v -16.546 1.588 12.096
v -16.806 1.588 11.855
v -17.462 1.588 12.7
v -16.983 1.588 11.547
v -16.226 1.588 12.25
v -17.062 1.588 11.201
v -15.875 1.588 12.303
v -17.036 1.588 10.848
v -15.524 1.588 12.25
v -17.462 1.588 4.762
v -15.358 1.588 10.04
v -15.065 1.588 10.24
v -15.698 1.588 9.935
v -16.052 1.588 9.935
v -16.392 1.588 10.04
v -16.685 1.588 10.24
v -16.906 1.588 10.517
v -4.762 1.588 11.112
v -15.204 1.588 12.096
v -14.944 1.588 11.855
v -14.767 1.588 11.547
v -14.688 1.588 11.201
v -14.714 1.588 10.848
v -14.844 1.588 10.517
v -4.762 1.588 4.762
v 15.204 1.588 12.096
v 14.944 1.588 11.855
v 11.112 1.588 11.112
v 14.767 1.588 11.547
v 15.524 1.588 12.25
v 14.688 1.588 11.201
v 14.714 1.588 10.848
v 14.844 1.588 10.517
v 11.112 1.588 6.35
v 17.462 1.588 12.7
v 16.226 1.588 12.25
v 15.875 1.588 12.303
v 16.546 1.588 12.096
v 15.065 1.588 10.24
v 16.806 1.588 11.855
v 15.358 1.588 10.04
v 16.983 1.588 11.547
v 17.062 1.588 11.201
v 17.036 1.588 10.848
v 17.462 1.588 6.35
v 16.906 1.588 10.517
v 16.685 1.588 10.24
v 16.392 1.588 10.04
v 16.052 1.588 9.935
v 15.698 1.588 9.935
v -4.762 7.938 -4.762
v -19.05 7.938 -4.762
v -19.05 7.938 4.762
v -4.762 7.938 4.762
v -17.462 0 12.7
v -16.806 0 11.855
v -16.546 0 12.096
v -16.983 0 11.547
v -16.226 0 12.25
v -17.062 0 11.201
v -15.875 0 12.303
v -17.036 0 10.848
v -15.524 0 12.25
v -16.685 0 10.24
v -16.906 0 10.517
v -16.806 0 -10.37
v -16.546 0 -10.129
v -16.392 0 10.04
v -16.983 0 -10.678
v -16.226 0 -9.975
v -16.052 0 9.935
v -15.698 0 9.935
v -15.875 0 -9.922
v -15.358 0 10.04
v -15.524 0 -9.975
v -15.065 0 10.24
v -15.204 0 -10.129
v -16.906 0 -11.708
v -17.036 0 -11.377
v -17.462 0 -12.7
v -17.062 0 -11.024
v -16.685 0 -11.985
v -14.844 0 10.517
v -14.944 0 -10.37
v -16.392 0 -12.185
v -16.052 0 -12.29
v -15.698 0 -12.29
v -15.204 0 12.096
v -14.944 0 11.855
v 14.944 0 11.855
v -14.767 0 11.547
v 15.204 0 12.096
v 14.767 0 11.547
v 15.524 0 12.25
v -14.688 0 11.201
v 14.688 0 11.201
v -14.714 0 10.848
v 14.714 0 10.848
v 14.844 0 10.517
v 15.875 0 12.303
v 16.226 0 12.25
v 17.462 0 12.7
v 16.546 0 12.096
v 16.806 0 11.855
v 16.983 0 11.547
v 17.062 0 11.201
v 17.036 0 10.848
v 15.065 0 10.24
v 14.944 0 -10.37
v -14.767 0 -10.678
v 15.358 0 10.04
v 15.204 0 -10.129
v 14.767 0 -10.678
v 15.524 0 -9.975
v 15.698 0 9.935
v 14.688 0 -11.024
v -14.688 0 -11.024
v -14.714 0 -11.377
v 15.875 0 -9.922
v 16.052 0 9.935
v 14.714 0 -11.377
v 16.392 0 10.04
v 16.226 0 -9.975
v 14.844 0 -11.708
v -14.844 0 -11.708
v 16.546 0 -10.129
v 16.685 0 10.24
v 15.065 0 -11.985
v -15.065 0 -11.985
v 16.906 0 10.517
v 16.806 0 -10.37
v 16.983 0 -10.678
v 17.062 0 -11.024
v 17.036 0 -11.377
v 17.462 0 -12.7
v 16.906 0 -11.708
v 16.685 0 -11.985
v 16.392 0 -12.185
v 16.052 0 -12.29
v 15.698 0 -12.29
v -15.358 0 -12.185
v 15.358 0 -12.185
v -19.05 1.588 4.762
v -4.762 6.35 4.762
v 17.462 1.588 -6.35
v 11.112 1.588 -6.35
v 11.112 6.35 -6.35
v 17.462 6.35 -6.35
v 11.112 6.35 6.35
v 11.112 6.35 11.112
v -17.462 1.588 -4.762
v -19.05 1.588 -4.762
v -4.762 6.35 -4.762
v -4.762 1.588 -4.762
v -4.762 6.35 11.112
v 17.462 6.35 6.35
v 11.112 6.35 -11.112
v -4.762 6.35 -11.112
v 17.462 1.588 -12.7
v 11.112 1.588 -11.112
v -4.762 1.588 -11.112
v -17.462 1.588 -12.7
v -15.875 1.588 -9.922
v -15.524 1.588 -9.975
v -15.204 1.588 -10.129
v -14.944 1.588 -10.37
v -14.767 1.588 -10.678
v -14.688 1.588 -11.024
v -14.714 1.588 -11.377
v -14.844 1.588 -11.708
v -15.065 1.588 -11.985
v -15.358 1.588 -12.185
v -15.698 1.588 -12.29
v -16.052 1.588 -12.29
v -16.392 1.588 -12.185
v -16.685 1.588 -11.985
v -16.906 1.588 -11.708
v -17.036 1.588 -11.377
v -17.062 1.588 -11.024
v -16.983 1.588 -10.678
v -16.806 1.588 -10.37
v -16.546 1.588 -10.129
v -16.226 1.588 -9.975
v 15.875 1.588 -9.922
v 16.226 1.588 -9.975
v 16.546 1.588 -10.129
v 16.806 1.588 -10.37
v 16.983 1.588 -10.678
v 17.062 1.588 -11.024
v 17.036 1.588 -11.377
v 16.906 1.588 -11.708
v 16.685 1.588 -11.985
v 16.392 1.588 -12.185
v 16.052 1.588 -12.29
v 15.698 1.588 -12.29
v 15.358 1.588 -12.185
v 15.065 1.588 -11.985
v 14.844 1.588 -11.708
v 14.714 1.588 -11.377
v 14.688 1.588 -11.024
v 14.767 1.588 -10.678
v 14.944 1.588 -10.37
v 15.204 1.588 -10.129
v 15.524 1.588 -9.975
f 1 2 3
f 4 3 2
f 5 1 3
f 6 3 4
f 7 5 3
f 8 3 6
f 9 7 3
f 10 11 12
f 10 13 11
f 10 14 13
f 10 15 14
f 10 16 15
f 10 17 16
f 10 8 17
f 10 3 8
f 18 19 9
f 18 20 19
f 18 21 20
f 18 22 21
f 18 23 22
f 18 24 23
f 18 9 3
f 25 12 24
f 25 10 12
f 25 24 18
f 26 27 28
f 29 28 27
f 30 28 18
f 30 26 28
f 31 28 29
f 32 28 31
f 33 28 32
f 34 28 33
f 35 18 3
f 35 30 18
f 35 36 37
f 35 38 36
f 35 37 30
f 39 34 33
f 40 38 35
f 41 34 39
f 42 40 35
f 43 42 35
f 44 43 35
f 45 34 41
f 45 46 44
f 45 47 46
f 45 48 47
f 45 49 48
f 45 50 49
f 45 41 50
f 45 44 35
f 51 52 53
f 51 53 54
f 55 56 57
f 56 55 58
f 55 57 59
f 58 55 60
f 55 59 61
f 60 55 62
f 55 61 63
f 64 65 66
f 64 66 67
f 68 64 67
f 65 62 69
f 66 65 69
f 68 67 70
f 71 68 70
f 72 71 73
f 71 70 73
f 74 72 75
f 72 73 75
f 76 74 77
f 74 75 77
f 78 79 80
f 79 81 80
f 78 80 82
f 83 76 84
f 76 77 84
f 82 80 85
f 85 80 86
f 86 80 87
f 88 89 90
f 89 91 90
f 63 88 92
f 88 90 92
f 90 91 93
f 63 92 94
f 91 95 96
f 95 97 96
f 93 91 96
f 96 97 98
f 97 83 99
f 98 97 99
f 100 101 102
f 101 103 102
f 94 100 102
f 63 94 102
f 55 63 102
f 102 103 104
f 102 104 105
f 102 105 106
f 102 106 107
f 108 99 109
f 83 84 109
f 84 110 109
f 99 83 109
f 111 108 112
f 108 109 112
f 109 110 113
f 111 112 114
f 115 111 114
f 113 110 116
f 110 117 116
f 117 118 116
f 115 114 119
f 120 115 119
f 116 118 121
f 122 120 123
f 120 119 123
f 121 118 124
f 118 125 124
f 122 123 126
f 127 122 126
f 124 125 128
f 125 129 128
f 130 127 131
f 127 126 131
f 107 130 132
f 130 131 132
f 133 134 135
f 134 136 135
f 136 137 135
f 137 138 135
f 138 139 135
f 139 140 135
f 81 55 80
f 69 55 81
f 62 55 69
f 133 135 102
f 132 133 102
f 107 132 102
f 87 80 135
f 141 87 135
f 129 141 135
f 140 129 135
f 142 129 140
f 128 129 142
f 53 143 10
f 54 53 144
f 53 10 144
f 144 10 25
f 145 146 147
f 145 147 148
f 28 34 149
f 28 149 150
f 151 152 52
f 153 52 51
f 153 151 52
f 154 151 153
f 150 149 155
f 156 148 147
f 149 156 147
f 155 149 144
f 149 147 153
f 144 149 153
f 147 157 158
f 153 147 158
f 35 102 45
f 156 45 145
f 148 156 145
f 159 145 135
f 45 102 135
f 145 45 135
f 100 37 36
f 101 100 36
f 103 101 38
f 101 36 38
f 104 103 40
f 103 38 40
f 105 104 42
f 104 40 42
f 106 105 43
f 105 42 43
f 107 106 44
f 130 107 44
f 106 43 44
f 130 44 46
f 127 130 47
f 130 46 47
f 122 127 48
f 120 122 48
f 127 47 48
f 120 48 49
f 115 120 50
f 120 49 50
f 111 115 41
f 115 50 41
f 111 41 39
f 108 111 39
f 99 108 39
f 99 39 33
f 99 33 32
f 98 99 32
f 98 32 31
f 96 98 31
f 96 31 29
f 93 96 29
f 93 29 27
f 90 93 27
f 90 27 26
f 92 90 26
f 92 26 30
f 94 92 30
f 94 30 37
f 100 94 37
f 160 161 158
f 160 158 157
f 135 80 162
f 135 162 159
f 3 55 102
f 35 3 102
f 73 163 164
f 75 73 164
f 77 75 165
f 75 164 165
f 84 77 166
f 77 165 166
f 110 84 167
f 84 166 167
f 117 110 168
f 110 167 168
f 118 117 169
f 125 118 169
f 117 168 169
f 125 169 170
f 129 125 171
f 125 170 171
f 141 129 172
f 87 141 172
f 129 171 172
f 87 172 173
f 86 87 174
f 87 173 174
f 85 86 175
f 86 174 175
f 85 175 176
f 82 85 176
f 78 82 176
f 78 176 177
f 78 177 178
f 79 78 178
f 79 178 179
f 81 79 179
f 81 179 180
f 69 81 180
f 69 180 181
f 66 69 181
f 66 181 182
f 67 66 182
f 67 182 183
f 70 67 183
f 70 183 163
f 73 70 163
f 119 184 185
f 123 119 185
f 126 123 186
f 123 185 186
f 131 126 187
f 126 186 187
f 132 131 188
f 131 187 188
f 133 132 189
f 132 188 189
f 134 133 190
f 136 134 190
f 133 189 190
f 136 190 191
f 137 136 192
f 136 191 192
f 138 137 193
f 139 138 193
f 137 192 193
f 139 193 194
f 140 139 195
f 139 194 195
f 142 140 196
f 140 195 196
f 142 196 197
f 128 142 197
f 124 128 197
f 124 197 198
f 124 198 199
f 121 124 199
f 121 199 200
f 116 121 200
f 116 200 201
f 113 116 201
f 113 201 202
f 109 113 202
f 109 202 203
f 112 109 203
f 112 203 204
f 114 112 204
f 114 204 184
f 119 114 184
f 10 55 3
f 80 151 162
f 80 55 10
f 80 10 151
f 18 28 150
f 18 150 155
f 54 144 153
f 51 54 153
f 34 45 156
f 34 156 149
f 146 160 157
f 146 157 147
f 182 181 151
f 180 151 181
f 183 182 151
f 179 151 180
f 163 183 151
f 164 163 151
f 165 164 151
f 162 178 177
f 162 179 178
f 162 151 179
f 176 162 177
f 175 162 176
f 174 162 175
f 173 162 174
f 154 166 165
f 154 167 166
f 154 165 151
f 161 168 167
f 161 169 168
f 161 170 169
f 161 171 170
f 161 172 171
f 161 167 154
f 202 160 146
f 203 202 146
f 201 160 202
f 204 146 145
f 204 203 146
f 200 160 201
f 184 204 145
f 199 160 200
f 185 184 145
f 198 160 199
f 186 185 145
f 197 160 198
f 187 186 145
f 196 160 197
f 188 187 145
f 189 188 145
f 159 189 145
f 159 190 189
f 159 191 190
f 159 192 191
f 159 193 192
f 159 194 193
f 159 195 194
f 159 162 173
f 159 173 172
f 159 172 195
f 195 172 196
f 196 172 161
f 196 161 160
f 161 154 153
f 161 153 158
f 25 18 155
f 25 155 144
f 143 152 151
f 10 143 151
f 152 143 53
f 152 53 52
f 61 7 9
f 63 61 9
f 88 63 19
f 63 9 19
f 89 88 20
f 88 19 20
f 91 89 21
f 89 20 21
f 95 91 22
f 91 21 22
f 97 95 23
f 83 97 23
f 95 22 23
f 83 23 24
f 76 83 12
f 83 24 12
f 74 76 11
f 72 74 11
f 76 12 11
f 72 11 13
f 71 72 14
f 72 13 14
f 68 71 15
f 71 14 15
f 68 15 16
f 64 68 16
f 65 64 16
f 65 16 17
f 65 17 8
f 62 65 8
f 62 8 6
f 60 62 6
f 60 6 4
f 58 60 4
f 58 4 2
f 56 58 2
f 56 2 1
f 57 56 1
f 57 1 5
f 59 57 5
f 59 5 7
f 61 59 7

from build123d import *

# Parameters (mm, degrees)
SKETCH1_W           = 34.925
SKETCH1_H           = 25.4
BOSS_EXTRUDE1_DEPTH = 1.5875
BOSS_EXTRUDE2_DEPTH = 4.7625
SKETCH4_W           = 14.2875
SKETCH4_H           = 9.525
BOSS_EXTRUDE7_DEPTH = 6.35
SKETCH6_R           = 1.190625
CUT_EXTRUDE1_DEPTH  = 24.759524406


with BuildPart() as part:
    # Sketch1 → Boss-Extrude1 (new body)
    with BuildSketch(Plane(origin=(0, 0, 0), x_dir=(1, 0, 0), z_dir=(0, 1, 0))):
        Rectangle(SKETCH1_W, SKETCH1_H)
    extrude(amount=BOSS_EXTRUDE1_DEPTH)

    # Sketch2 → Boss-Extrude2 (add)
    with BuildSketch(Plane(origin=(0, 1.5875, 0), x_dir=(1, 0, 0), z_dir=(0, 1, 0))):
        Polygon((-4.7625, 11.1125), (11.1125, 11.1125), (11.1125, 6.35), (17.4625, 6.35), (17.4625, -6.35), (11.1125, -6.35), (11.1125, -11.1125), (-4.7625, -11.1125), align=None)
    extrude(amount=BOSS_EXTRUDE2_DEPTH)

    # Sketch4 → Boss-Extrude7 (add)
    with BuildSketch(Plane(origin=(0, 1.5875, 0), x_dir=(1, 0, 0), z_dir=(0, 1, 0))):
        with Locations((-11.90625, 0)):
            Rectangle(SKETCH4_W, SKETCH4_H)
    extrude(amount=BOSS_EXTRUDE7_DEPTH)

    # Sketch6 → Cut-Extrude1 (cut, through all)
    with BuildSketch(Plane(origin=(0, 1.5875, 0), x_dir=(1, 0, 0), z_dir=(0, 1, 0))):
        with Locations(Location((-15.875, 11.1125, 0), (0, 0, 270))):
            Circle(SKETCH6_R)
        with Locations(Location((-15.875, -11.1125, 0), (0, 0, 270))):
            Circle(SKETCH6_R)
        with Locations(Location((15.875, -11.1125, 0), (0, 0, 270))):
            Circle(SKETCH6_R)
        with Locations(Location((15.875, 11.1125, 0), (0, 0, 270))):
            Circle(SKETCH6_R)
    extrude(amount=-CUT_EXTRUDE1_DEPTH, mode=Mode.SUBTRACT)


solid = part.part
